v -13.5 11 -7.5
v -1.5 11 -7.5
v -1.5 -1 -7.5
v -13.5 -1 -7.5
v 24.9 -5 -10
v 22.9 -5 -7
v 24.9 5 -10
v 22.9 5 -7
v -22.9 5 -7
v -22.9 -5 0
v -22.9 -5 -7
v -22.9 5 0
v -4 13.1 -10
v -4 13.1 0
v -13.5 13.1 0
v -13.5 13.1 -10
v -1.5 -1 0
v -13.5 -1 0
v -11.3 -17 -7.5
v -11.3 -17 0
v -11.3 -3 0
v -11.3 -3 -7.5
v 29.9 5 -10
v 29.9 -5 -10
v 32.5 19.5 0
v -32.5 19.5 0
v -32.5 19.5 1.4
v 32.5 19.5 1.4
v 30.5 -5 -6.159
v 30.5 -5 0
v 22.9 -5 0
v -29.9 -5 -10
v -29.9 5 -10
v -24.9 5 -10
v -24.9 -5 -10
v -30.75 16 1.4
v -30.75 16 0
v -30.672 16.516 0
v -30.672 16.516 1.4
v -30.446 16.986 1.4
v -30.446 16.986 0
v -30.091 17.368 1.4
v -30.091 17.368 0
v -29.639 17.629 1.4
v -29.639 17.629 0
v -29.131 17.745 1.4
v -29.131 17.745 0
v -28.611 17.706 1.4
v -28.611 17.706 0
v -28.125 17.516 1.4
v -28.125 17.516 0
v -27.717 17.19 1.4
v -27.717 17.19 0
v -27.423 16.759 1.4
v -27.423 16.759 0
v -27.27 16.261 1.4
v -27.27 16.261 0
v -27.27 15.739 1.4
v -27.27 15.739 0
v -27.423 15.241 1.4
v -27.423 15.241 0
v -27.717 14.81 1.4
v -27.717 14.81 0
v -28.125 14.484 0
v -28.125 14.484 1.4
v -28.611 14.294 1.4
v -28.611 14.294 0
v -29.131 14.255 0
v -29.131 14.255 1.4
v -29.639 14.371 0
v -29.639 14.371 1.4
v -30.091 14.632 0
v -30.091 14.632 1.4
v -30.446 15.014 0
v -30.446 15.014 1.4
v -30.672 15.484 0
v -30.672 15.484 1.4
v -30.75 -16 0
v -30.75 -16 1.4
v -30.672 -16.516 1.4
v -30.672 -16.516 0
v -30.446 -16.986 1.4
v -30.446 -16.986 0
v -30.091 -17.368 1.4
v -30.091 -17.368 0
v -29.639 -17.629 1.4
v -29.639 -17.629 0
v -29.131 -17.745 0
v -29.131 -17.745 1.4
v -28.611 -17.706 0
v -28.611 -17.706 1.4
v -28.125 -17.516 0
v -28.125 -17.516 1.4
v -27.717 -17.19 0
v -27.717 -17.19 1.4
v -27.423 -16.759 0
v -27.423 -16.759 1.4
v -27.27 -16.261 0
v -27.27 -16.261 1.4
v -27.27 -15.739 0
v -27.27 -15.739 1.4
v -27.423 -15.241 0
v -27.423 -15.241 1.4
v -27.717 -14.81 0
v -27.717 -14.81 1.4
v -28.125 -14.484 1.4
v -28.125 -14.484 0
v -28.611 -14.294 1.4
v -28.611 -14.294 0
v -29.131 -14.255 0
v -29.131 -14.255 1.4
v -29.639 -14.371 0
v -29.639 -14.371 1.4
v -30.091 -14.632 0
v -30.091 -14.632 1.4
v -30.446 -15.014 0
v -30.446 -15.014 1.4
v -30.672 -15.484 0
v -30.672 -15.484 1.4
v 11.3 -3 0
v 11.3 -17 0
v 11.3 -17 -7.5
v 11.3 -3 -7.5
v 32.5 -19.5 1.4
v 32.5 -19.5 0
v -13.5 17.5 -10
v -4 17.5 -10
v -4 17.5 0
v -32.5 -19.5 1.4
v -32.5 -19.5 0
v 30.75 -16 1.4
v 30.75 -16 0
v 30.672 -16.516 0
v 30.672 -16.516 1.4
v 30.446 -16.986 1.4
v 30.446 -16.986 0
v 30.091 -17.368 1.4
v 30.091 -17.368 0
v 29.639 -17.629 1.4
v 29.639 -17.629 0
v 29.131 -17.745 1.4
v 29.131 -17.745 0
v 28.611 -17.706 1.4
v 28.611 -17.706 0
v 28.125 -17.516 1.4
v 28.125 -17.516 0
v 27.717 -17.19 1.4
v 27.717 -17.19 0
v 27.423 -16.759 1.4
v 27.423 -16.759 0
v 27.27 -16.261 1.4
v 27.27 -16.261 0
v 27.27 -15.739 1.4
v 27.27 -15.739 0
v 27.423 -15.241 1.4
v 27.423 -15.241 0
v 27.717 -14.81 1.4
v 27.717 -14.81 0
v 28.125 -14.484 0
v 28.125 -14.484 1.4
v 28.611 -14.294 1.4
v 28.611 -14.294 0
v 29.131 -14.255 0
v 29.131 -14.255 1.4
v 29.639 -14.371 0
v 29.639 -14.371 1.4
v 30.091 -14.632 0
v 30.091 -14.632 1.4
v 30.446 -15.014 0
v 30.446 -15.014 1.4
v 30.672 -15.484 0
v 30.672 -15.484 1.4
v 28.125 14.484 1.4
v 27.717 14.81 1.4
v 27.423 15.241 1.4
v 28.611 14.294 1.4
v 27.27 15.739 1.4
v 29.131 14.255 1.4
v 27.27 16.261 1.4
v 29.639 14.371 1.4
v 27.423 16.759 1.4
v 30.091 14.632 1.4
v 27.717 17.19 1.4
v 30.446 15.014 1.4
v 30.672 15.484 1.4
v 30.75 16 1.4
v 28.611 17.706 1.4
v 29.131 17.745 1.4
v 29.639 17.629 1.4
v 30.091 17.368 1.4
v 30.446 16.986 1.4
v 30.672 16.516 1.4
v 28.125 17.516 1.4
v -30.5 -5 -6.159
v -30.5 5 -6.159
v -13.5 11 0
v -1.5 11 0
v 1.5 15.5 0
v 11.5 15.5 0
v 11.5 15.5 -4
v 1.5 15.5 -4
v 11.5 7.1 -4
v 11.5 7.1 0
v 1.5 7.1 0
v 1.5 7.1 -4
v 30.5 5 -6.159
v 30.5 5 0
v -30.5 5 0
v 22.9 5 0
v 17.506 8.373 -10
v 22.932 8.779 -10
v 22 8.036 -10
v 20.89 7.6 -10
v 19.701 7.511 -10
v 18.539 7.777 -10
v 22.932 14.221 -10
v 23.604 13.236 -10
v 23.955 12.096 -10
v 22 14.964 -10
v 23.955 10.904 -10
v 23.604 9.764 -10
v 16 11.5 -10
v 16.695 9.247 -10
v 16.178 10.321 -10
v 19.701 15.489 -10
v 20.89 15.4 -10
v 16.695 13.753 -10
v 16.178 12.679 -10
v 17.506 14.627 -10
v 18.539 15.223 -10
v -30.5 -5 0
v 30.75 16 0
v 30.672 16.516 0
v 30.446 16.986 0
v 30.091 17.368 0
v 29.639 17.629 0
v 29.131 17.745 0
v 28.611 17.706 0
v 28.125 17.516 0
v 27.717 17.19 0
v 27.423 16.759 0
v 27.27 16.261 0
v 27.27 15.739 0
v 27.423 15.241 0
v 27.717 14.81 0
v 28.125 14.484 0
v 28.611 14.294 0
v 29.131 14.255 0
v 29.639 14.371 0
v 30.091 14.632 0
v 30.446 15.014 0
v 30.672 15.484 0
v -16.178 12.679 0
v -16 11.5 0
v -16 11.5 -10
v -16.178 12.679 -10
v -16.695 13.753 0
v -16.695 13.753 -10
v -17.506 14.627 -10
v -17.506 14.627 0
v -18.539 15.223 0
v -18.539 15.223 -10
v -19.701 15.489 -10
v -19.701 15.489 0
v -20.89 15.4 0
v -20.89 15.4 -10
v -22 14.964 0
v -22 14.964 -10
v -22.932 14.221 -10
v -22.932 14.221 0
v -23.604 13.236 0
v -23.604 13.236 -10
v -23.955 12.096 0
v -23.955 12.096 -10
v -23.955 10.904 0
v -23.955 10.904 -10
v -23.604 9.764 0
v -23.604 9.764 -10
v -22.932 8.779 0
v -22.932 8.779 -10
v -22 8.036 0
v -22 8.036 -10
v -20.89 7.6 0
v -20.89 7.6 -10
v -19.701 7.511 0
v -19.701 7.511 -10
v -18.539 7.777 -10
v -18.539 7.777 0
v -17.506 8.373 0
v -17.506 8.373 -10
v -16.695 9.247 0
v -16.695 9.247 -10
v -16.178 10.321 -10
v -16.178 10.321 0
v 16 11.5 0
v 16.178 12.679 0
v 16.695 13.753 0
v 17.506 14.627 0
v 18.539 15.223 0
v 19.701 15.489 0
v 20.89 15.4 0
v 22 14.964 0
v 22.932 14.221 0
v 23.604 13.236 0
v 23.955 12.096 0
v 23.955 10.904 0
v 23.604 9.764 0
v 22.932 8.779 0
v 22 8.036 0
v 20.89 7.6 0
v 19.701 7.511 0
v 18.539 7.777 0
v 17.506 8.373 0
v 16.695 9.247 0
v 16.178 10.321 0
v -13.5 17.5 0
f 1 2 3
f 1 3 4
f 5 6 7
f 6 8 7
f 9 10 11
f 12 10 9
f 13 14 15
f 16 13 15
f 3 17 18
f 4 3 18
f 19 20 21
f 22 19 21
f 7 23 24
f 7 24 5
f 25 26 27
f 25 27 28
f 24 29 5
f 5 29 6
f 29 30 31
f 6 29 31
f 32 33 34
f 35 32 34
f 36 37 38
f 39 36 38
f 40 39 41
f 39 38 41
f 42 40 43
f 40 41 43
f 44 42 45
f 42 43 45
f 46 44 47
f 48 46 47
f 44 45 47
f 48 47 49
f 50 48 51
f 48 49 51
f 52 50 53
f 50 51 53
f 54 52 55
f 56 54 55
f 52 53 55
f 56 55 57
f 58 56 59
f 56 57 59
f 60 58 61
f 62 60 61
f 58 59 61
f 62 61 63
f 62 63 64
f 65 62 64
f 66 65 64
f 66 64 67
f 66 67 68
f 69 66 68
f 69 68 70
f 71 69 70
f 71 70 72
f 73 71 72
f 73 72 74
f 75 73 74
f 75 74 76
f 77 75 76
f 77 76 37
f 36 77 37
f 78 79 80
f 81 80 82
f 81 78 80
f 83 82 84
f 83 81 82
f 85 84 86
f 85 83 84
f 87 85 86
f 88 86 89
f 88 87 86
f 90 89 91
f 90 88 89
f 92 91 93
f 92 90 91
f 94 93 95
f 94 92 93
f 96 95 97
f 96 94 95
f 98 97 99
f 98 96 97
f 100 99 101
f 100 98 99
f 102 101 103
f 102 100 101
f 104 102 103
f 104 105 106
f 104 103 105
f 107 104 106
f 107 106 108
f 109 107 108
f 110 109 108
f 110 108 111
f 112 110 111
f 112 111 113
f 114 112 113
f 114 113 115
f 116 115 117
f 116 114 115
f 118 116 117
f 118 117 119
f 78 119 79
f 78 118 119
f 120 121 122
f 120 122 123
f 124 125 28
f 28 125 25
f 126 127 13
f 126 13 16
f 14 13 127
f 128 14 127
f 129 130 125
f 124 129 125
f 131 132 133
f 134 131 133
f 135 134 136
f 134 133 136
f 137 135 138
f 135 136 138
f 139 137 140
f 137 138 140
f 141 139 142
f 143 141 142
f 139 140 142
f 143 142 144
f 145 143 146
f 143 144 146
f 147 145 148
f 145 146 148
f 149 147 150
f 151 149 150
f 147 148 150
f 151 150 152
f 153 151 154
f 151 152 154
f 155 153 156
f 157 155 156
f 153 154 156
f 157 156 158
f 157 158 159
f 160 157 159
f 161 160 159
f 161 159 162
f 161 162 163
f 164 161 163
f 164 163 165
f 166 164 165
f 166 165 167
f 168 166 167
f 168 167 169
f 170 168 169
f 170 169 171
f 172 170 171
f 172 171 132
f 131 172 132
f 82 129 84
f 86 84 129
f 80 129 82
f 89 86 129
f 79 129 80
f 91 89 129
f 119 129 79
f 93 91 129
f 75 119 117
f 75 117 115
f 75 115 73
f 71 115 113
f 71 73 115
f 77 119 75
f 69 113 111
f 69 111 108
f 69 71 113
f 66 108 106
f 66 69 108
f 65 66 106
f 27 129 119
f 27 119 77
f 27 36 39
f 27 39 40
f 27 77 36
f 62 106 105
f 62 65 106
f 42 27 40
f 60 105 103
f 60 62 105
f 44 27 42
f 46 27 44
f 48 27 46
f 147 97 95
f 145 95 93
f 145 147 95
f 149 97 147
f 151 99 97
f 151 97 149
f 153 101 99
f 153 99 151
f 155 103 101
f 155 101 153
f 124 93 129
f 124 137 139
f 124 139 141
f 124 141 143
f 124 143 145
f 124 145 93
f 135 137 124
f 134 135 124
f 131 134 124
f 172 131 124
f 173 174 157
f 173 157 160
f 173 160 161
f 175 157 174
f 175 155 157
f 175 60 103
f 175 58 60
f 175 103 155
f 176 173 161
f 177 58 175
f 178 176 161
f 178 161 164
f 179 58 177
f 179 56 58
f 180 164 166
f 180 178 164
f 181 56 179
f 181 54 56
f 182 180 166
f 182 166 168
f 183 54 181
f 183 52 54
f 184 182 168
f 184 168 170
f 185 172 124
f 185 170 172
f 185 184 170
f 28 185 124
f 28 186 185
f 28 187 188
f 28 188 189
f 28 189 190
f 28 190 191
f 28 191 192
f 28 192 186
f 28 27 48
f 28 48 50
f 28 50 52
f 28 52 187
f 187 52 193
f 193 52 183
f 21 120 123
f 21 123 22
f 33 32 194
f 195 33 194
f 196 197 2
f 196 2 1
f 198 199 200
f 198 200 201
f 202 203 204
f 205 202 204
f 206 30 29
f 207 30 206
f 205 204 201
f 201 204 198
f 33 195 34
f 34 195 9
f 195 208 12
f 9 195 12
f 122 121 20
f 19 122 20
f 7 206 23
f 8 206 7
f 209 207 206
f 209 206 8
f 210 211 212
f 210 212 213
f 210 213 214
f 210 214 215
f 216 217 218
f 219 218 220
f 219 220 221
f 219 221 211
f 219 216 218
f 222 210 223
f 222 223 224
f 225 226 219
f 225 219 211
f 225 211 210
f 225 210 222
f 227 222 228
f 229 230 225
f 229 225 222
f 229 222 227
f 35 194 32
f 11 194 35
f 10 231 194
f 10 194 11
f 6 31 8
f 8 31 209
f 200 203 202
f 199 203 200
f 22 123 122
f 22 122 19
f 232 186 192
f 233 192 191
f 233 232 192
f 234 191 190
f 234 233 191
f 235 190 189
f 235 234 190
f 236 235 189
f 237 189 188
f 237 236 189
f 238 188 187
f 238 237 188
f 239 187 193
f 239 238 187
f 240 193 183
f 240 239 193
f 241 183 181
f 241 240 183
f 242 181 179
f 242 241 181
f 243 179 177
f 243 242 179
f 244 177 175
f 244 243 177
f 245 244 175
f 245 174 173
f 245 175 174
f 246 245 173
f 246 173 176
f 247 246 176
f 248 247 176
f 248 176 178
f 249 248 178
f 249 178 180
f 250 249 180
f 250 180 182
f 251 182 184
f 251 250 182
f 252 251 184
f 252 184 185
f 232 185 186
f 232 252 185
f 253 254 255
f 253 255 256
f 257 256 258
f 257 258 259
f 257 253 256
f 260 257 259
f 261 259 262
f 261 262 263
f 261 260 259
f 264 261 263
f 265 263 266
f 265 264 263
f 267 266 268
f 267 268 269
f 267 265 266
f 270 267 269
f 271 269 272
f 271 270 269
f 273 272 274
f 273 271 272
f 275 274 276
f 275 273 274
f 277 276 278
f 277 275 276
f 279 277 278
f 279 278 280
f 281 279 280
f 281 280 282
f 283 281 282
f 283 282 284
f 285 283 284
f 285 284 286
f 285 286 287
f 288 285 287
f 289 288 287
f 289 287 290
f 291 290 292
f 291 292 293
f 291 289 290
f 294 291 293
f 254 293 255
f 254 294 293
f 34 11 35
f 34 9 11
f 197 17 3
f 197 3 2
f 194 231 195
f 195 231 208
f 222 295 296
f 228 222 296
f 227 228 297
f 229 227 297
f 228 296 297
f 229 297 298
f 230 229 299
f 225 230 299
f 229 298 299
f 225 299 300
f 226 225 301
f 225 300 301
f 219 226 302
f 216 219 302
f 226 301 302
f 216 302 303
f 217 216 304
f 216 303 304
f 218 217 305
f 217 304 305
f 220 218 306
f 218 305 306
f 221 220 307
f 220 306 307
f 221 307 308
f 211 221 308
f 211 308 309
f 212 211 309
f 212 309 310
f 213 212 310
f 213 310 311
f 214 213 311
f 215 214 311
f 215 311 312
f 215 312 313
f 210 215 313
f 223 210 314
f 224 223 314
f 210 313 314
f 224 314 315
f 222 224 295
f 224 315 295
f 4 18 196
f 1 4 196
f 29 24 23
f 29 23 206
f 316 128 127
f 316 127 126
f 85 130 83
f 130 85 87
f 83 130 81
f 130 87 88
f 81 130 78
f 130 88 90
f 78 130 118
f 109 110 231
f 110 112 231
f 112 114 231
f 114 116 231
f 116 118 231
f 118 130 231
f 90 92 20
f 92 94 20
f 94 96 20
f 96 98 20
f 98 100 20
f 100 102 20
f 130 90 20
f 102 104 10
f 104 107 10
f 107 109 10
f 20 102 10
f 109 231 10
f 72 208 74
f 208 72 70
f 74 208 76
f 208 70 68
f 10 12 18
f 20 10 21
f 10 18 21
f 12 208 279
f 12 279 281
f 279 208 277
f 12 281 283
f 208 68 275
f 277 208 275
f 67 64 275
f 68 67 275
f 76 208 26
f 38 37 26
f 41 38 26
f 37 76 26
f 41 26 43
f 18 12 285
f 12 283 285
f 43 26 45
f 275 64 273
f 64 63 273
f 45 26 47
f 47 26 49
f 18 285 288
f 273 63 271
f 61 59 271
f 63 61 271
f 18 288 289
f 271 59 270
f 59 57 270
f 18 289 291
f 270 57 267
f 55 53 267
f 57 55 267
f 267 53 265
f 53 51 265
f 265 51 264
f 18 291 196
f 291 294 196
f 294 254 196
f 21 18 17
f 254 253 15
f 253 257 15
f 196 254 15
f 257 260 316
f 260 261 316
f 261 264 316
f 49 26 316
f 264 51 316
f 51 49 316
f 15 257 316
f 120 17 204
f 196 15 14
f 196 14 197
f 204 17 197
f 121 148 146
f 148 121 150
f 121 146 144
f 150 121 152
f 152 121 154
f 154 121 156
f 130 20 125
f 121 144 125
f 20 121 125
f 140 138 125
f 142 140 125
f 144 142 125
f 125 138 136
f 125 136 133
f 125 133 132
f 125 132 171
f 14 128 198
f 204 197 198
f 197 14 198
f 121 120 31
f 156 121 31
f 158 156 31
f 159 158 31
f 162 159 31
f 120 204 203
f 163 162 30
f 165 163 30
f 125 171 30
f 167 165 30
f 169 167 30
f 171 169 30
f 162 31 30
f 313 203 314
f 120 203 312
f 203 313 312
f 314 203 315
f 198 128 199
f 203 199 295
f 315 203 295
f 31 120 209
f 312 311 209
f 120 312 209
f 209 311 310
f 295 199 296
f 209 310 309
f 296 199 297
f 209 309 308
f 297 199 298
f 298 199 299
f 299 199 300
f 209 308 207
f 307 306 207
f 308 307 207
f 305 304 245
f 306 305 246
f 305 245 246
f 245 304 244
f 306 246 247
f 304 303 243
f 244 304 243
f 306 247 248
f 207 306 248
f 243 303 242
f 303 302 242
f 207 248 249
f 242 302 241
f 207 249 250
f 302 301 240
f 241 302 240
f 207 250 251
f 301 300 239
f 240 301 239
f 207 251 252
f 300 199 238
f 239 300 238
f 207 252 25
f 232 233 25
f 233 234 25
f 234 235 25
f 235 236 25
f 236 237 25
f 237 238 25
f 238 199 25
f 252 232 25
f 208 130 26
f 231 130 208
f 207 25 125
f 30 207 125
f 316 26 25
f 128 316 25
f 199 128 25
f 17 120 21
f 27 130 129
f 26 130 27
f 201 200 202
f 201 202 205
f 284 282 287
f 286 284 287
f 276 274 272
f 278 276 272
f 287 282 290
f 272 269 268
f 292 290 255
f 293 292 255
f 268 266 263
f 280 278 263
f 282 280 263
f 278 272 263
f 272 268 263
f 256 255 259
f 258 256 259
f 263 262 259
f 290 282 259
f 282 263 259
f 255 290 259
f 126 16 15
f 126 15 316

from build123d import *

# Parameters (mm, degrees)
SKETCH_W                = 65
SKETCH_H                = 39
PAD_DEPTH               = 1.4
SKETCH001_R             = 1.75
POCKET_DEPTH            = 153.031604
SKETCH001_MIRRORED_2_R  = 1.75
POCKET_MIRRORED_2_DEPTH = 153.031604
SKETCH002_W             = 7.6
SKETCH002_H             = 10
PAD001_DEPTH            = 10
POCKET001_DEPTH         = 5
SKETCH004_W             = 22.6
SKETCH004_H             = 14
PAD002_DEPTH            = 7.5
SKETCH005_R             = 4
PAD003_DEPTH            = 10
SKETCH006_W             = 12
SKETCH006_H             = 12
PAD004_DEPTH            = 7.5
SKETCH007_W             = 9.5
SKETCH007_H             = 4.4
PAD005_DEPTH            = 10
SKETCH008_W             = 10
SKETCH008_H             = 8.4
PAD006_DEPTH            = 4


with BuildPart() as part:
    # Sketch → Pad (new body)
    with BuildSketch(Plane.XY):
        Rectangle(SKETCH_W, SKETCH_H)
    extrude(amount=PAD_DEPTH)

    # Sketch001 → Pocket (cut, through all)
    with BuildSketch(Plane.XY):
        with Locations((29, 16)):
            Circle(SKETCH001_R)
    pocket = extrude(amount=POCKET_DEPTH, mode=Mode.SUBTRACT)

    # Sketch001 Mirrored 2 → Pocket Mirrored 2 (cut, through all)
    with BuildSketch(Plane(origin=(0, 0, 0), x_dir=(-1, 0, 0), z_dir=(0, 0, -1))):
        with Locations((29, 16)):
            Circle(SKETCH001_MIRRORED_2_R)
    pocket_mirrored_2 = extrude(amount=-POCKET_MIRRORED_2_DEPTH, mode=Mode.SUBTRACT)

    # Mirrored001: Pocket, Pocket Mirrored 2 across Sketch001 H_Axis
    add(pocket.mirror(Plane.ZX), mode=Mode.SUBTRACT)
    add(pocket_mirrored_2.mirror(Plane.ZX), mode=Mode.SUBTRACT)

    # Sketch002 → Pad001 (join)
    with BuildSketch(Plane(origin=(0, 0, 0), x_dir=(-1, 0, 0), z_dir=(0, 0, -1))):
        with Locations((-26.7, 0)):
            Rectangle(SKETCH002_W, SKETCH002_H)
    pad001 = extrude(amount=PAD001_DEPTH)

    # Sketch003 → Pocket001 (cut, symmetric)
    with BuildSketch(Plane.XZ):
        Polygon((22.9, -7), (24.9, -10), (22.9, -10), align=None)
        Polygon((29.9, -10), (30.5, -6.159395), (30.5, -10), align=None)
    pocket001 = extrude(amount=POCKET001_DEPTH, both=True, mode=Mode.SUBTRACT)

    # Sketch004 → Pad002 (join)
    with BuildSketch(Plane(origin=(0, 0, 0), x_dir=(-1, 0, 0), z_dir=(0, 0, -1))):
        with Locations((0, -10)):
            Rectangle(SKETCH004_W, SKETCH004_H)
    extrude(amount=PAD002_DEPTH)

    # Sketch005 → Pad003 (join)
    with BuildSketch(Plane(origin=(0, 0, 0), x_dir=(-1, 0, 0), z_dir=(0, 0, -1))):
        with Locations((-20, 11.5)):
            Circle(SKETCH005_R)
    pad003 = extrude(amount=PAD003_DEPTH)

    # Mirrored002: Pad001, Pocket001, Pad003 across Sketch002 V_Axis
    add(pad001.mirror(Plane(origin=(0, 0, 0), x_dir=(0, 0, -1), z_dir=(-1, 0, 0))))
    add(pocket001.mirror(Plane(origin=(0, 0, 0), x_dir=(0, 0, -1), z_dir=(-1, 0, 0))), mode=Mode.SUBTRACT)
    add(pad003.mirror(Plane(origin=(0, 0, 0), x_dir=(0, 0, -1), z_dir=(-1, 0, 0))))

    # Sketch006 → Pad004 (join)
    with BuildSketch(Plane(origin=(0, 0, 0), x_dir=(-1, 0, 0), z_dir=(0, 0, -1))):
        with Locations((7.5, 5)):
            Rectangle(SKETCH006_W, SKETCH006_H)
    extrude(amount=PAD004_DEPTH)

    # Sketch007 → Pad005 (join)
    with BuildSketch(Plane(origin=(0, 0, 0), x_dir=(-1, 0, 0), z_dir=(0, 0, -1))):
        with Locations((8.75, 15.3)):
            Rectangle(SKETCH007_W, SKETCH007_H)
    extrude(amount=PAD005_DEPTH)

    # Sketch008 → Pad006 (join)
    with BuildSketch(Plane(origin=(0, 0, 0), x_dir=(-1, 0, 0), z_dir=(0, 0, -1))):
        with Locations((-6.5, 11.3)):
            Rectangle(SKETCH008_W, SKETCH008_H)
    extrude(amount=PAD006_DEPTH)


solid = part.part
